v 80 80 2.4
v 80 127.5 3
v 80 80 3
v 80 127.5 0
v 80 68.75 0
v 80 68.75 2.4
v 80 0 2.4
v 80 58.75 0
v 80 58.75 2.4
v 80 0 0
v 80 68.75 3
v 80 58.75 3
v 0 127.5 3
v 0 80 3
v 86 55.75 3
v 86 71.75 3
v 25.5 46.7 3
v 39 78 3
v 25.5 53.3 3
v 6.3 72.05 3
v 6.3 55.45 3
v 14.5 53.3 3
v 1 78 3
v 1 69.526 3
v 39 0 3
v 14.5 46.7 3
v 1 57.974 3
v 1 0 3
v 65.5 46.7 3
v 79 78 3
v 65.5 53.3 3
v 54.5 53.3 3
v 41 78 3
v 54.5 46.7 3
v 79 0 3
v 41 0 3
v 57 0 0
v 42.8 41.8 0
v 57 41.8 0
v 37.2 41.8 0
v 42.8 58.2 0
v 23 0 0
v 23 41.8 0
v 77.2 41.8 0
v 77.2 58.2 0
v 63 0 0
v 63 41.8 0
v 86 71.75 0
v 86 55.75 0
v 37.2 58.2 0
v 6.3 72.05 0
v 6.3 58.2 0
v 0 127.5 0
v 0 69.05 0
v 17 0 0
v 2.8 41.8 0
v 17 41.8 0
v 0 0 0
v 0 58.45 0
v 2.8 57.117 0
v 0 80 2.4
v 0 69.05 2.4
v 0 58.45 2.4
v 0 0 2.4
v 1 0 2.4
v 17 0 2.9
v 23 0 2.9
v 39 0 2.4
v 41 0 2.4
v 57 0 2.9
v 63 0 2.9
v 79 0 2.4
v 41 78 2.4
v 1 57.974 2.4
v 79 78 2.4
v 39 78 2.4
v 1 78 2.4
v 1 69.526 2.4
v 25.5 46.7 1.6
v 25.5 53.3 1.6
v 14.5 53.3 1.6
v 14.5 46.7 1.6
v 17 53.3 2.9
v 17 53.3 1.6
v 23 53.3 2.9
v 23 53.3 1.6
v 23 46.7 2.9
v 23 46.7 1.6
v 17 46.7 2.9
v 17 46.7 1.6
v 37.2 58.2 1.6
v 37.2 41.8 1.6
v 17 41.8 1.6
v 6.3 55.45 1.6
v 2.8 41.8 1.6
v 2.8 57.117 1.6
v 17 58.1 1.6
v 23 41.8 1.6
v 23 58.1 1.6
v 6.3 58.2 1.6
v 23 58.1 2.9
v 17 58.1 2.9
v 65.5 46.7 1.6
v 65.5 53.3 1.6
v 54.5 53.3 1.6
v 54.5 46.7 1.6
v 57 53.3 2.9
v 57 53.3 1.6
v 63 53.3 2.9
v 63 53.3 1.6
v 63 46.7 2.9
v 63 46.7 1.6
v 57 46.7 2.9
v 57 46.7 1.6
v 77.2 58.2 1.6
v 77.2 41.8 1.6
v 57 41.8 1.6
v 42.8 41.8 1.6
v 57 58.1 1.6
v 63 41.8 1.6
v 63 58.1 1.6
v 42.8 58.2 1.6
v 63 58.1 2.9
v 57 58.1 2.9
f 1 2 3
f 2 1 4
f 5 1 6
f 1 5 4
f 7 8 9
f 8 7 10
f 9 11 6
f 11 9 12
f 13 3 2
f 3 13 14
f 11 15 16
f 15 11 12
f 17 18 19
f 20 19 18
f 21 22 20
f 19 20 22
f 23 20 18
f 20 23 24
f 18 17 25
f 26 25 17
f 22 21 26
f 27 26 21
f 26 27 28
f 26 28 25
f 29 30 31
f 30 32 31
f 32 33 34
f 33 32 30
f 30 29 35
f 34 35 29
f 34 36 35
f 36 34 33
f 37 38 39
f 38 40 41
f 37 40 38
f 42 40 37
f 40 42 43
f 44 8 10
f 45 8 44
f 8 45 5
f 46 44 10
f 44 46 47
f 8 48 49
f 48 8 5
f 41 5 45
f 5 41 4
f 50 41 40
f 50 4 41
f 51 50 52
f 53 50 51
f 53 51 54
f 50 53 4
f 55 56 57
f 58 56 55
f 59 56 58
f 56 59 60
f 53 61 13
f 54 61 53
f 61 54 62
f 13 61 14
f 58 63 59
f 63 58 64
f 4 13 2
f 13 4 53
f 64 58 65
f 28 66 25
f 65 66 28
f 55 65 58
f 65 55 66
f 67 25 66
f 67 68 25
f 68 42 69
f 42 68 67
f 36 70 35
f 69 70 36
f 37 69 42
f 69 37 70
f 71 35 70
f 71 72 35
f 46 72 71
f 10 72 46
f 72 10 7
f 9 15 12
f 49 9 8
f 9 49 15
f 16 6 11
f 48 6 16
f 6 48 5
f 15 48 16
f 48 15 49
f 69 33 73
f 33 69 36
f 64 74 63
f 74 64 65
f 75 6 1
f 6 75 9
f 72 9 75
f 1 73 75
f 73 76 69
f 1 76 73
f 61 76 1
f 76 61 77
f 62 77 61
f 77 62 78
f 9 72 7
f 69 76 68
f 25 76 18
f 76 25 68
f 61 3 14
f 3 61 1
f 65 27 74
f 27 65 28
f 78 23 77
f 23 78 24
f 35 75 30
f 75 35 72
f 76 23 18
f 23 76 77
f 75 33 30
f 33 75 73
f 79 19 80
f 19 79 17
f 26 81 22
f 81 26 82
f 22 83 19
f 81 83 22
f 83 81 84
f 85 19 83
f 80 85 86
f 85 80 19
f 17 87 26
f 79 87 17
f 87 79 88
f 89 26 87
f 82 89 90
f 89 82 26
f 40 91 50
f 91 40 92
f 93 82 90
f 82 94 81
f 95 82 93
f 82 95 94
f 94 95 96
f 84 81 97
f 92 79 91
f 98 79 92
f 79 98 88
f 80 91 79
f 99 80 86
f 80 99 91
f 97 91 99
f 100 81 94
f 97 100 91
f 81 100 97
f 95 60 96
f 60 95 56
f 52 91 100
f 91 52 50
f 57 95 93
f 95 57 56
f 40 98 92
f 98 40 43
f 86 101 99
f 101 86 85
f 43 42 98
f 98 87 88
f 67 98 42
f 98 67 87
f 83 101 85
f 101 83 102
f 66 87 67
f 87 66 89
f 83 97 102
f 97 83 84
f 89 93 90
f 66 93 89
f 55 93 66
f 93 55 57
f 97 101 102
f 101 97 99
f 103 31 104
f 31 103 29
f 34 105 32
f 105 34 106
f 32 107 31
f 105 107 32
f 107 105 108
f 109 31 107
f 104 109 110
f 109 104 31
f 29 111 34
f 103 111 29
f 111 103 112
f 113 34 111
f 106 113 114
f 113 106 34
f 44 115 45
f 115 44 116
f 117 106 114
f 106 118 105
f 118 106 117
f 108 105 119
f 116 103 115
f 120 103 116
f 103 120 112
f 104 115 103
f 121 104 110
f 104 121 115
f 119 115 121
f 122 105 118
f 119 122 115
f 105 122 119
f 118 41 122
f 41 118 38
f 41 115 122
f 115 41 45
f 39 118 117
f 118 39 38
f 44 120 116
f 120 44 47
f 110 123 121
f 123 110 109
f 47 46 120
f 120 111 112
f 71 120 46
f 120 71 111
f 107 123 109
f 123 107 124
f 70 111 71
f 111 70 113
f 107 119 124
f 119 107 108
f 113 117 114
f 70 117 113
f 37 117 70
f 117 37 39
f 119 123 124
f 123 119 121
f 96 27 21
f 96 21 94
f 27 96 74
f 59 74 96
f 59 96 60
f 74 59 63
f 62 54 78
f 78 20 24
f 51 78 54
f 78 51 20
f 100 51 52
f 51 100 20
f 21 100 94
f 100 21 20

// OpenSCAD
/*
 * Módulo de duas vagas — maquete 1:64
 * ===================================
 *
 * Uma peça de 80 × 127,5 mm contendo duas vagas lado a lado mais a metade do
 * corredor à frente delas. São necessárias oito peças idênticas: um único STL
 * impresso oito vezes (CLAUDE.md, seção 4).
 *
 *   4 módulos × 80 mm = 320 mm de fileira, × 2 fileiras encostadas pelo corredor
 *   2 × 127,5 mm + 25 mm de calçada de fundo + 25 mm da outra ponta = 305 mm
 *
 * Por que módulos e não uma placa única: mesa da impressora pequena, risco de
 * empenamento numa peça de 34 cm e fila de impressora — se uma peça falhar,
 * reimprime-se 3 h, não 24 h.
 *
 * Como gerar o STL:
 *   openscad -o modulo_vaga.stl -D "peca=\"modulo\"" modulo_vaga.scad
 *   openscad -o calcada.stl     -D "peca=\"calcada\"" modulo_vaga.scad
 *
 * Ou abra no OpenSCAD, escolha a peça na variável abaixo e tecle F6, F7.
 */

// Qual peça gerar: "modulo", "calcada" ou "conjunto" (só para conferir o encaixe)
peca = "modulo";

/* ------------------------------------------------------------------ Cotas --
 * Todas derivadas de medidas reais divididas por 64.
 */
VAGA_LARGURA     = 40;      // 2,5 m reais
VAGA_PROFUNDIDADE = 80;     // 5,0 m reais
CORREDOR         = 95;      // 6,0 m reais — o módulo carrega metade
CALCADA          = 25;      // 1,6 m reais
FAIXA_LARGURA    = 2;       // 12 cm reais
FAIXA_PROFUNDIDADE = 0.6;   // rebaixo, não ressalto: ressalto vira degrau

MODULO_LARGURA   = VAGA_LARGURA * 2;            // 80
MODULO_COMPRIMENTO = VAGA_PROFUNDIDADE + CORREDOR / 2;  // 127,5
ESPESSURA        = 3;       // rígido o bastante em PLA sem gastar filamento

/* --------------------------------------------------------------- Sensores --
 * O furo fica a 30 mm da borda do corredor — e não no centro geométrico da
 * vaga. Motivo prático: o Hot Wheels tem vão entre os eixos, e um sensor no
 * centro exato enxerga o chão por baixo do carrinho. A 30 mm da frente, o
 * sensor fica sob a região sempre sólida da carroceria.
 */
SENSOR_DISTANCIA_CORREDOR = 30;

// Corpo do TCRT5000 (10,2 × 5,8 mm) mais 0,4 mm de folga por lado
SENSOR_FURO_X    = 11;
SENSOR_FURO_Y    = 6.6;

// Berço para a plaquinha do módulo comparador, na face inferior
BERCO_X          = 34.4;    // placa de 34 mm + 0,4 de folga
BERCO_Y          = 16.4;
BERCO_PROFUNDIDADE = 1.6;

/* ----------------------------------------------------------------- Cabos ---
 * Canaleta na face inferior, saindo pelo lado da calçada: os fios nunca cruzam
 * o corredor, onde ficariam à vista na foto e no vídeo da defesa.
 */
CANALETA        = 6;        // 6 × 6 mm

/* ---------------------------------------------------------------- Encaixe --
 * Cauda de andorinha com 0,3 mm de folga. Sem folga, duas peças em PLA não
 * entram uma na outra depois da contração da primeira camada.
 */
RABO_PROFUNDIDADE = 6;
RABO_BASE       = 10;
RABO_TOPO       = 16;
RABO_FOLGA      = 0.3;

$fn = 48;

/* =========================================================== Geometria === */

// Posição do centro de cada sensor, medida do fundo (lado da calçada)
function y_sensor() = VAGA_PROFUNDIDADE - SENSOR_DISTANCIA_CORREDOR;
function x_vaga(i)  = VAGA_LARGURA * i + VAGA_LARGURA / 2;   // i = 0 ou 1

/** Perfil da cauda de andorinha, deitado no plano XY e extrudado em Z. */
module perfil_rabo(folga = 0) {
  meia_base = RABO_BASE / 2 + folga;
  meio_topo = RABO_TOPO / 2 + folga;
  profundidade = RABO_PROFUNDIDADE + folga;

  polygon(points = [
    [-meia_base, 0],
    [ meia_base, 0],
    [ meio_topo, profundidade],
    [-meio_topo, profundidade],
  ]);
}

/** Macho: sobra na face direita (x = MODULO_LARGURA). */
module rabo_macho() {
  translate([MODULO_LARGURA, MODULO_COMPRIMENTO / 2, 0])
    rotate([0, 0, -90])
      linear_extrude(height = ESPESSURA)
        perfil_rabo(0);
}

/** Fêmea: falta na face esquerda (x = 0), com folga para o macho entrar. */
module rabo_femea() {
  translate([0, MODULO_COMPRIMENTO / 2, -0.1])
    rotate([0, 0, -90])
      linear_extrude(height = ESPESSURA + 0.2)
        perfil_rabo(RABO_FOLGA);
}

/** Rebaixo de 0,6 mm que desenha a faixa demarcatória na superfície. */
module faixa(x, y, largura, comprimento) {
  translate([x, y, ESPESSURA - FAIXA_PROFUNDIDADE])
    cube([largura, comprimento, FAIXA_PROFUNDIDADE + 0.1]);
}

module faixas_do_modulo() {
  // Duas vagas encostadas compartilham a faixa entre elas: ela é desenhada uma
  // vez só, centrada na divisa, metade em cada vaga.
  faixa(VAGA_LARGURA - FAIXA_LARGURA / 2, 0, FAIXA_LARGURA, VAGA_PROFUNDIDADE);

  // Faixas das bordas laterais: cada módulo desenha metade, e a outra metade
  // vem do módulo vizinho — o resultado montado tem faixas de 2 mm uniformes.
  faixa(0, 0, FAIXA_LARGURA / 2, VAGA_PROFUNDIDADE);
  faixa(MODULO_LARGURA - FAIXA_LARGURA / 2, 0, FAIXA_LARGURA / 2, VAGA_PROFUNDIDADE);

  // Linha da frente, onde a vaga encontra o corredor
  faixa(0, VAGA_PROFUNDIDADE - FAIXA_LARGURA, MODULO_LARGURA, FAIXA_LARGURA);
}

module furos_e_bercos() {
  for (i = [0, 1]) {
    x = x_vaga(i);
    y = y_sensor();

    // Furo passante por onde o TCRT5000 enxerga o carrinho
    translate([x - SENSOR_FURO_X / 2, y - SENSOR_FURO_Y / 2, -0.1])
      cube([SENSOR_FURO_X, SENSOR_FURO_Y, ESPESSURA + 0.2]);

    // Berço da plaquinha, aberto para baixo
    translate([x - BERCO_X / 2, y - BERCO_Y / 2, -0.1])
      cube([BERCO_X, BERCO_Y, BERCO_PROFUNDIDADE + 0.1]);

    // Canaleta do berço até a borda do fundo (lado da calçada)
    translate([x - CANALETA / 2, -0.1, -0.1])
      cube([CANALETA, y + BERCO_Y / 2, CANALETA / 2]);
  }
}

module modulo_vaga() {
  difference() {
    union() {
      cube([MODULO_LARGURA, MODULO_COMPRIMENTO, ESPESSURA]);
      rabo_macho();
    }

    rabo_femea();
    faixas_do_modulo();
    furos_e_bercos();
  }
}

/** Tira reta de calçada, 25 mm de largura. Comprimento livre. */
module calcada(comprimento = 80) {
  ALTURA_MEIO_FIO = 1.2;  // 7,7 cm reais — meio-fio baixo, de estacionamento

  union() {
    cube([comprimento, CALCADA, ESPESSURA]);
    // Meio-fio na borda que dá para o asfalto
    translate([0, CALCADA - 1.5, ESPESSURA])
      cube([comprimento, 1.5, ALTURA_MEIO_FIO]);
  }
}

/** Só para conferir o encaixe antes de mandar imprimir oito vezes. */
module conjunto_de_conferencia() {
  for (i = [0, 1]) {
    translate([i * MODULO_LARGURA, 0, 0]) modulo_vaga();
  }
  translate([0, -CALCADA - 2, 0]) calcada(MODULO_LARGURA * 2);
}

/* ============================================================== Saída ==== */

if (peca == "modulo")        modulo_vaga();
else if (peca == "calcada")  calcada(80);
else if (peca == "conjunto") conjunto_de_conferencia();
else                         modulo_vaga();
